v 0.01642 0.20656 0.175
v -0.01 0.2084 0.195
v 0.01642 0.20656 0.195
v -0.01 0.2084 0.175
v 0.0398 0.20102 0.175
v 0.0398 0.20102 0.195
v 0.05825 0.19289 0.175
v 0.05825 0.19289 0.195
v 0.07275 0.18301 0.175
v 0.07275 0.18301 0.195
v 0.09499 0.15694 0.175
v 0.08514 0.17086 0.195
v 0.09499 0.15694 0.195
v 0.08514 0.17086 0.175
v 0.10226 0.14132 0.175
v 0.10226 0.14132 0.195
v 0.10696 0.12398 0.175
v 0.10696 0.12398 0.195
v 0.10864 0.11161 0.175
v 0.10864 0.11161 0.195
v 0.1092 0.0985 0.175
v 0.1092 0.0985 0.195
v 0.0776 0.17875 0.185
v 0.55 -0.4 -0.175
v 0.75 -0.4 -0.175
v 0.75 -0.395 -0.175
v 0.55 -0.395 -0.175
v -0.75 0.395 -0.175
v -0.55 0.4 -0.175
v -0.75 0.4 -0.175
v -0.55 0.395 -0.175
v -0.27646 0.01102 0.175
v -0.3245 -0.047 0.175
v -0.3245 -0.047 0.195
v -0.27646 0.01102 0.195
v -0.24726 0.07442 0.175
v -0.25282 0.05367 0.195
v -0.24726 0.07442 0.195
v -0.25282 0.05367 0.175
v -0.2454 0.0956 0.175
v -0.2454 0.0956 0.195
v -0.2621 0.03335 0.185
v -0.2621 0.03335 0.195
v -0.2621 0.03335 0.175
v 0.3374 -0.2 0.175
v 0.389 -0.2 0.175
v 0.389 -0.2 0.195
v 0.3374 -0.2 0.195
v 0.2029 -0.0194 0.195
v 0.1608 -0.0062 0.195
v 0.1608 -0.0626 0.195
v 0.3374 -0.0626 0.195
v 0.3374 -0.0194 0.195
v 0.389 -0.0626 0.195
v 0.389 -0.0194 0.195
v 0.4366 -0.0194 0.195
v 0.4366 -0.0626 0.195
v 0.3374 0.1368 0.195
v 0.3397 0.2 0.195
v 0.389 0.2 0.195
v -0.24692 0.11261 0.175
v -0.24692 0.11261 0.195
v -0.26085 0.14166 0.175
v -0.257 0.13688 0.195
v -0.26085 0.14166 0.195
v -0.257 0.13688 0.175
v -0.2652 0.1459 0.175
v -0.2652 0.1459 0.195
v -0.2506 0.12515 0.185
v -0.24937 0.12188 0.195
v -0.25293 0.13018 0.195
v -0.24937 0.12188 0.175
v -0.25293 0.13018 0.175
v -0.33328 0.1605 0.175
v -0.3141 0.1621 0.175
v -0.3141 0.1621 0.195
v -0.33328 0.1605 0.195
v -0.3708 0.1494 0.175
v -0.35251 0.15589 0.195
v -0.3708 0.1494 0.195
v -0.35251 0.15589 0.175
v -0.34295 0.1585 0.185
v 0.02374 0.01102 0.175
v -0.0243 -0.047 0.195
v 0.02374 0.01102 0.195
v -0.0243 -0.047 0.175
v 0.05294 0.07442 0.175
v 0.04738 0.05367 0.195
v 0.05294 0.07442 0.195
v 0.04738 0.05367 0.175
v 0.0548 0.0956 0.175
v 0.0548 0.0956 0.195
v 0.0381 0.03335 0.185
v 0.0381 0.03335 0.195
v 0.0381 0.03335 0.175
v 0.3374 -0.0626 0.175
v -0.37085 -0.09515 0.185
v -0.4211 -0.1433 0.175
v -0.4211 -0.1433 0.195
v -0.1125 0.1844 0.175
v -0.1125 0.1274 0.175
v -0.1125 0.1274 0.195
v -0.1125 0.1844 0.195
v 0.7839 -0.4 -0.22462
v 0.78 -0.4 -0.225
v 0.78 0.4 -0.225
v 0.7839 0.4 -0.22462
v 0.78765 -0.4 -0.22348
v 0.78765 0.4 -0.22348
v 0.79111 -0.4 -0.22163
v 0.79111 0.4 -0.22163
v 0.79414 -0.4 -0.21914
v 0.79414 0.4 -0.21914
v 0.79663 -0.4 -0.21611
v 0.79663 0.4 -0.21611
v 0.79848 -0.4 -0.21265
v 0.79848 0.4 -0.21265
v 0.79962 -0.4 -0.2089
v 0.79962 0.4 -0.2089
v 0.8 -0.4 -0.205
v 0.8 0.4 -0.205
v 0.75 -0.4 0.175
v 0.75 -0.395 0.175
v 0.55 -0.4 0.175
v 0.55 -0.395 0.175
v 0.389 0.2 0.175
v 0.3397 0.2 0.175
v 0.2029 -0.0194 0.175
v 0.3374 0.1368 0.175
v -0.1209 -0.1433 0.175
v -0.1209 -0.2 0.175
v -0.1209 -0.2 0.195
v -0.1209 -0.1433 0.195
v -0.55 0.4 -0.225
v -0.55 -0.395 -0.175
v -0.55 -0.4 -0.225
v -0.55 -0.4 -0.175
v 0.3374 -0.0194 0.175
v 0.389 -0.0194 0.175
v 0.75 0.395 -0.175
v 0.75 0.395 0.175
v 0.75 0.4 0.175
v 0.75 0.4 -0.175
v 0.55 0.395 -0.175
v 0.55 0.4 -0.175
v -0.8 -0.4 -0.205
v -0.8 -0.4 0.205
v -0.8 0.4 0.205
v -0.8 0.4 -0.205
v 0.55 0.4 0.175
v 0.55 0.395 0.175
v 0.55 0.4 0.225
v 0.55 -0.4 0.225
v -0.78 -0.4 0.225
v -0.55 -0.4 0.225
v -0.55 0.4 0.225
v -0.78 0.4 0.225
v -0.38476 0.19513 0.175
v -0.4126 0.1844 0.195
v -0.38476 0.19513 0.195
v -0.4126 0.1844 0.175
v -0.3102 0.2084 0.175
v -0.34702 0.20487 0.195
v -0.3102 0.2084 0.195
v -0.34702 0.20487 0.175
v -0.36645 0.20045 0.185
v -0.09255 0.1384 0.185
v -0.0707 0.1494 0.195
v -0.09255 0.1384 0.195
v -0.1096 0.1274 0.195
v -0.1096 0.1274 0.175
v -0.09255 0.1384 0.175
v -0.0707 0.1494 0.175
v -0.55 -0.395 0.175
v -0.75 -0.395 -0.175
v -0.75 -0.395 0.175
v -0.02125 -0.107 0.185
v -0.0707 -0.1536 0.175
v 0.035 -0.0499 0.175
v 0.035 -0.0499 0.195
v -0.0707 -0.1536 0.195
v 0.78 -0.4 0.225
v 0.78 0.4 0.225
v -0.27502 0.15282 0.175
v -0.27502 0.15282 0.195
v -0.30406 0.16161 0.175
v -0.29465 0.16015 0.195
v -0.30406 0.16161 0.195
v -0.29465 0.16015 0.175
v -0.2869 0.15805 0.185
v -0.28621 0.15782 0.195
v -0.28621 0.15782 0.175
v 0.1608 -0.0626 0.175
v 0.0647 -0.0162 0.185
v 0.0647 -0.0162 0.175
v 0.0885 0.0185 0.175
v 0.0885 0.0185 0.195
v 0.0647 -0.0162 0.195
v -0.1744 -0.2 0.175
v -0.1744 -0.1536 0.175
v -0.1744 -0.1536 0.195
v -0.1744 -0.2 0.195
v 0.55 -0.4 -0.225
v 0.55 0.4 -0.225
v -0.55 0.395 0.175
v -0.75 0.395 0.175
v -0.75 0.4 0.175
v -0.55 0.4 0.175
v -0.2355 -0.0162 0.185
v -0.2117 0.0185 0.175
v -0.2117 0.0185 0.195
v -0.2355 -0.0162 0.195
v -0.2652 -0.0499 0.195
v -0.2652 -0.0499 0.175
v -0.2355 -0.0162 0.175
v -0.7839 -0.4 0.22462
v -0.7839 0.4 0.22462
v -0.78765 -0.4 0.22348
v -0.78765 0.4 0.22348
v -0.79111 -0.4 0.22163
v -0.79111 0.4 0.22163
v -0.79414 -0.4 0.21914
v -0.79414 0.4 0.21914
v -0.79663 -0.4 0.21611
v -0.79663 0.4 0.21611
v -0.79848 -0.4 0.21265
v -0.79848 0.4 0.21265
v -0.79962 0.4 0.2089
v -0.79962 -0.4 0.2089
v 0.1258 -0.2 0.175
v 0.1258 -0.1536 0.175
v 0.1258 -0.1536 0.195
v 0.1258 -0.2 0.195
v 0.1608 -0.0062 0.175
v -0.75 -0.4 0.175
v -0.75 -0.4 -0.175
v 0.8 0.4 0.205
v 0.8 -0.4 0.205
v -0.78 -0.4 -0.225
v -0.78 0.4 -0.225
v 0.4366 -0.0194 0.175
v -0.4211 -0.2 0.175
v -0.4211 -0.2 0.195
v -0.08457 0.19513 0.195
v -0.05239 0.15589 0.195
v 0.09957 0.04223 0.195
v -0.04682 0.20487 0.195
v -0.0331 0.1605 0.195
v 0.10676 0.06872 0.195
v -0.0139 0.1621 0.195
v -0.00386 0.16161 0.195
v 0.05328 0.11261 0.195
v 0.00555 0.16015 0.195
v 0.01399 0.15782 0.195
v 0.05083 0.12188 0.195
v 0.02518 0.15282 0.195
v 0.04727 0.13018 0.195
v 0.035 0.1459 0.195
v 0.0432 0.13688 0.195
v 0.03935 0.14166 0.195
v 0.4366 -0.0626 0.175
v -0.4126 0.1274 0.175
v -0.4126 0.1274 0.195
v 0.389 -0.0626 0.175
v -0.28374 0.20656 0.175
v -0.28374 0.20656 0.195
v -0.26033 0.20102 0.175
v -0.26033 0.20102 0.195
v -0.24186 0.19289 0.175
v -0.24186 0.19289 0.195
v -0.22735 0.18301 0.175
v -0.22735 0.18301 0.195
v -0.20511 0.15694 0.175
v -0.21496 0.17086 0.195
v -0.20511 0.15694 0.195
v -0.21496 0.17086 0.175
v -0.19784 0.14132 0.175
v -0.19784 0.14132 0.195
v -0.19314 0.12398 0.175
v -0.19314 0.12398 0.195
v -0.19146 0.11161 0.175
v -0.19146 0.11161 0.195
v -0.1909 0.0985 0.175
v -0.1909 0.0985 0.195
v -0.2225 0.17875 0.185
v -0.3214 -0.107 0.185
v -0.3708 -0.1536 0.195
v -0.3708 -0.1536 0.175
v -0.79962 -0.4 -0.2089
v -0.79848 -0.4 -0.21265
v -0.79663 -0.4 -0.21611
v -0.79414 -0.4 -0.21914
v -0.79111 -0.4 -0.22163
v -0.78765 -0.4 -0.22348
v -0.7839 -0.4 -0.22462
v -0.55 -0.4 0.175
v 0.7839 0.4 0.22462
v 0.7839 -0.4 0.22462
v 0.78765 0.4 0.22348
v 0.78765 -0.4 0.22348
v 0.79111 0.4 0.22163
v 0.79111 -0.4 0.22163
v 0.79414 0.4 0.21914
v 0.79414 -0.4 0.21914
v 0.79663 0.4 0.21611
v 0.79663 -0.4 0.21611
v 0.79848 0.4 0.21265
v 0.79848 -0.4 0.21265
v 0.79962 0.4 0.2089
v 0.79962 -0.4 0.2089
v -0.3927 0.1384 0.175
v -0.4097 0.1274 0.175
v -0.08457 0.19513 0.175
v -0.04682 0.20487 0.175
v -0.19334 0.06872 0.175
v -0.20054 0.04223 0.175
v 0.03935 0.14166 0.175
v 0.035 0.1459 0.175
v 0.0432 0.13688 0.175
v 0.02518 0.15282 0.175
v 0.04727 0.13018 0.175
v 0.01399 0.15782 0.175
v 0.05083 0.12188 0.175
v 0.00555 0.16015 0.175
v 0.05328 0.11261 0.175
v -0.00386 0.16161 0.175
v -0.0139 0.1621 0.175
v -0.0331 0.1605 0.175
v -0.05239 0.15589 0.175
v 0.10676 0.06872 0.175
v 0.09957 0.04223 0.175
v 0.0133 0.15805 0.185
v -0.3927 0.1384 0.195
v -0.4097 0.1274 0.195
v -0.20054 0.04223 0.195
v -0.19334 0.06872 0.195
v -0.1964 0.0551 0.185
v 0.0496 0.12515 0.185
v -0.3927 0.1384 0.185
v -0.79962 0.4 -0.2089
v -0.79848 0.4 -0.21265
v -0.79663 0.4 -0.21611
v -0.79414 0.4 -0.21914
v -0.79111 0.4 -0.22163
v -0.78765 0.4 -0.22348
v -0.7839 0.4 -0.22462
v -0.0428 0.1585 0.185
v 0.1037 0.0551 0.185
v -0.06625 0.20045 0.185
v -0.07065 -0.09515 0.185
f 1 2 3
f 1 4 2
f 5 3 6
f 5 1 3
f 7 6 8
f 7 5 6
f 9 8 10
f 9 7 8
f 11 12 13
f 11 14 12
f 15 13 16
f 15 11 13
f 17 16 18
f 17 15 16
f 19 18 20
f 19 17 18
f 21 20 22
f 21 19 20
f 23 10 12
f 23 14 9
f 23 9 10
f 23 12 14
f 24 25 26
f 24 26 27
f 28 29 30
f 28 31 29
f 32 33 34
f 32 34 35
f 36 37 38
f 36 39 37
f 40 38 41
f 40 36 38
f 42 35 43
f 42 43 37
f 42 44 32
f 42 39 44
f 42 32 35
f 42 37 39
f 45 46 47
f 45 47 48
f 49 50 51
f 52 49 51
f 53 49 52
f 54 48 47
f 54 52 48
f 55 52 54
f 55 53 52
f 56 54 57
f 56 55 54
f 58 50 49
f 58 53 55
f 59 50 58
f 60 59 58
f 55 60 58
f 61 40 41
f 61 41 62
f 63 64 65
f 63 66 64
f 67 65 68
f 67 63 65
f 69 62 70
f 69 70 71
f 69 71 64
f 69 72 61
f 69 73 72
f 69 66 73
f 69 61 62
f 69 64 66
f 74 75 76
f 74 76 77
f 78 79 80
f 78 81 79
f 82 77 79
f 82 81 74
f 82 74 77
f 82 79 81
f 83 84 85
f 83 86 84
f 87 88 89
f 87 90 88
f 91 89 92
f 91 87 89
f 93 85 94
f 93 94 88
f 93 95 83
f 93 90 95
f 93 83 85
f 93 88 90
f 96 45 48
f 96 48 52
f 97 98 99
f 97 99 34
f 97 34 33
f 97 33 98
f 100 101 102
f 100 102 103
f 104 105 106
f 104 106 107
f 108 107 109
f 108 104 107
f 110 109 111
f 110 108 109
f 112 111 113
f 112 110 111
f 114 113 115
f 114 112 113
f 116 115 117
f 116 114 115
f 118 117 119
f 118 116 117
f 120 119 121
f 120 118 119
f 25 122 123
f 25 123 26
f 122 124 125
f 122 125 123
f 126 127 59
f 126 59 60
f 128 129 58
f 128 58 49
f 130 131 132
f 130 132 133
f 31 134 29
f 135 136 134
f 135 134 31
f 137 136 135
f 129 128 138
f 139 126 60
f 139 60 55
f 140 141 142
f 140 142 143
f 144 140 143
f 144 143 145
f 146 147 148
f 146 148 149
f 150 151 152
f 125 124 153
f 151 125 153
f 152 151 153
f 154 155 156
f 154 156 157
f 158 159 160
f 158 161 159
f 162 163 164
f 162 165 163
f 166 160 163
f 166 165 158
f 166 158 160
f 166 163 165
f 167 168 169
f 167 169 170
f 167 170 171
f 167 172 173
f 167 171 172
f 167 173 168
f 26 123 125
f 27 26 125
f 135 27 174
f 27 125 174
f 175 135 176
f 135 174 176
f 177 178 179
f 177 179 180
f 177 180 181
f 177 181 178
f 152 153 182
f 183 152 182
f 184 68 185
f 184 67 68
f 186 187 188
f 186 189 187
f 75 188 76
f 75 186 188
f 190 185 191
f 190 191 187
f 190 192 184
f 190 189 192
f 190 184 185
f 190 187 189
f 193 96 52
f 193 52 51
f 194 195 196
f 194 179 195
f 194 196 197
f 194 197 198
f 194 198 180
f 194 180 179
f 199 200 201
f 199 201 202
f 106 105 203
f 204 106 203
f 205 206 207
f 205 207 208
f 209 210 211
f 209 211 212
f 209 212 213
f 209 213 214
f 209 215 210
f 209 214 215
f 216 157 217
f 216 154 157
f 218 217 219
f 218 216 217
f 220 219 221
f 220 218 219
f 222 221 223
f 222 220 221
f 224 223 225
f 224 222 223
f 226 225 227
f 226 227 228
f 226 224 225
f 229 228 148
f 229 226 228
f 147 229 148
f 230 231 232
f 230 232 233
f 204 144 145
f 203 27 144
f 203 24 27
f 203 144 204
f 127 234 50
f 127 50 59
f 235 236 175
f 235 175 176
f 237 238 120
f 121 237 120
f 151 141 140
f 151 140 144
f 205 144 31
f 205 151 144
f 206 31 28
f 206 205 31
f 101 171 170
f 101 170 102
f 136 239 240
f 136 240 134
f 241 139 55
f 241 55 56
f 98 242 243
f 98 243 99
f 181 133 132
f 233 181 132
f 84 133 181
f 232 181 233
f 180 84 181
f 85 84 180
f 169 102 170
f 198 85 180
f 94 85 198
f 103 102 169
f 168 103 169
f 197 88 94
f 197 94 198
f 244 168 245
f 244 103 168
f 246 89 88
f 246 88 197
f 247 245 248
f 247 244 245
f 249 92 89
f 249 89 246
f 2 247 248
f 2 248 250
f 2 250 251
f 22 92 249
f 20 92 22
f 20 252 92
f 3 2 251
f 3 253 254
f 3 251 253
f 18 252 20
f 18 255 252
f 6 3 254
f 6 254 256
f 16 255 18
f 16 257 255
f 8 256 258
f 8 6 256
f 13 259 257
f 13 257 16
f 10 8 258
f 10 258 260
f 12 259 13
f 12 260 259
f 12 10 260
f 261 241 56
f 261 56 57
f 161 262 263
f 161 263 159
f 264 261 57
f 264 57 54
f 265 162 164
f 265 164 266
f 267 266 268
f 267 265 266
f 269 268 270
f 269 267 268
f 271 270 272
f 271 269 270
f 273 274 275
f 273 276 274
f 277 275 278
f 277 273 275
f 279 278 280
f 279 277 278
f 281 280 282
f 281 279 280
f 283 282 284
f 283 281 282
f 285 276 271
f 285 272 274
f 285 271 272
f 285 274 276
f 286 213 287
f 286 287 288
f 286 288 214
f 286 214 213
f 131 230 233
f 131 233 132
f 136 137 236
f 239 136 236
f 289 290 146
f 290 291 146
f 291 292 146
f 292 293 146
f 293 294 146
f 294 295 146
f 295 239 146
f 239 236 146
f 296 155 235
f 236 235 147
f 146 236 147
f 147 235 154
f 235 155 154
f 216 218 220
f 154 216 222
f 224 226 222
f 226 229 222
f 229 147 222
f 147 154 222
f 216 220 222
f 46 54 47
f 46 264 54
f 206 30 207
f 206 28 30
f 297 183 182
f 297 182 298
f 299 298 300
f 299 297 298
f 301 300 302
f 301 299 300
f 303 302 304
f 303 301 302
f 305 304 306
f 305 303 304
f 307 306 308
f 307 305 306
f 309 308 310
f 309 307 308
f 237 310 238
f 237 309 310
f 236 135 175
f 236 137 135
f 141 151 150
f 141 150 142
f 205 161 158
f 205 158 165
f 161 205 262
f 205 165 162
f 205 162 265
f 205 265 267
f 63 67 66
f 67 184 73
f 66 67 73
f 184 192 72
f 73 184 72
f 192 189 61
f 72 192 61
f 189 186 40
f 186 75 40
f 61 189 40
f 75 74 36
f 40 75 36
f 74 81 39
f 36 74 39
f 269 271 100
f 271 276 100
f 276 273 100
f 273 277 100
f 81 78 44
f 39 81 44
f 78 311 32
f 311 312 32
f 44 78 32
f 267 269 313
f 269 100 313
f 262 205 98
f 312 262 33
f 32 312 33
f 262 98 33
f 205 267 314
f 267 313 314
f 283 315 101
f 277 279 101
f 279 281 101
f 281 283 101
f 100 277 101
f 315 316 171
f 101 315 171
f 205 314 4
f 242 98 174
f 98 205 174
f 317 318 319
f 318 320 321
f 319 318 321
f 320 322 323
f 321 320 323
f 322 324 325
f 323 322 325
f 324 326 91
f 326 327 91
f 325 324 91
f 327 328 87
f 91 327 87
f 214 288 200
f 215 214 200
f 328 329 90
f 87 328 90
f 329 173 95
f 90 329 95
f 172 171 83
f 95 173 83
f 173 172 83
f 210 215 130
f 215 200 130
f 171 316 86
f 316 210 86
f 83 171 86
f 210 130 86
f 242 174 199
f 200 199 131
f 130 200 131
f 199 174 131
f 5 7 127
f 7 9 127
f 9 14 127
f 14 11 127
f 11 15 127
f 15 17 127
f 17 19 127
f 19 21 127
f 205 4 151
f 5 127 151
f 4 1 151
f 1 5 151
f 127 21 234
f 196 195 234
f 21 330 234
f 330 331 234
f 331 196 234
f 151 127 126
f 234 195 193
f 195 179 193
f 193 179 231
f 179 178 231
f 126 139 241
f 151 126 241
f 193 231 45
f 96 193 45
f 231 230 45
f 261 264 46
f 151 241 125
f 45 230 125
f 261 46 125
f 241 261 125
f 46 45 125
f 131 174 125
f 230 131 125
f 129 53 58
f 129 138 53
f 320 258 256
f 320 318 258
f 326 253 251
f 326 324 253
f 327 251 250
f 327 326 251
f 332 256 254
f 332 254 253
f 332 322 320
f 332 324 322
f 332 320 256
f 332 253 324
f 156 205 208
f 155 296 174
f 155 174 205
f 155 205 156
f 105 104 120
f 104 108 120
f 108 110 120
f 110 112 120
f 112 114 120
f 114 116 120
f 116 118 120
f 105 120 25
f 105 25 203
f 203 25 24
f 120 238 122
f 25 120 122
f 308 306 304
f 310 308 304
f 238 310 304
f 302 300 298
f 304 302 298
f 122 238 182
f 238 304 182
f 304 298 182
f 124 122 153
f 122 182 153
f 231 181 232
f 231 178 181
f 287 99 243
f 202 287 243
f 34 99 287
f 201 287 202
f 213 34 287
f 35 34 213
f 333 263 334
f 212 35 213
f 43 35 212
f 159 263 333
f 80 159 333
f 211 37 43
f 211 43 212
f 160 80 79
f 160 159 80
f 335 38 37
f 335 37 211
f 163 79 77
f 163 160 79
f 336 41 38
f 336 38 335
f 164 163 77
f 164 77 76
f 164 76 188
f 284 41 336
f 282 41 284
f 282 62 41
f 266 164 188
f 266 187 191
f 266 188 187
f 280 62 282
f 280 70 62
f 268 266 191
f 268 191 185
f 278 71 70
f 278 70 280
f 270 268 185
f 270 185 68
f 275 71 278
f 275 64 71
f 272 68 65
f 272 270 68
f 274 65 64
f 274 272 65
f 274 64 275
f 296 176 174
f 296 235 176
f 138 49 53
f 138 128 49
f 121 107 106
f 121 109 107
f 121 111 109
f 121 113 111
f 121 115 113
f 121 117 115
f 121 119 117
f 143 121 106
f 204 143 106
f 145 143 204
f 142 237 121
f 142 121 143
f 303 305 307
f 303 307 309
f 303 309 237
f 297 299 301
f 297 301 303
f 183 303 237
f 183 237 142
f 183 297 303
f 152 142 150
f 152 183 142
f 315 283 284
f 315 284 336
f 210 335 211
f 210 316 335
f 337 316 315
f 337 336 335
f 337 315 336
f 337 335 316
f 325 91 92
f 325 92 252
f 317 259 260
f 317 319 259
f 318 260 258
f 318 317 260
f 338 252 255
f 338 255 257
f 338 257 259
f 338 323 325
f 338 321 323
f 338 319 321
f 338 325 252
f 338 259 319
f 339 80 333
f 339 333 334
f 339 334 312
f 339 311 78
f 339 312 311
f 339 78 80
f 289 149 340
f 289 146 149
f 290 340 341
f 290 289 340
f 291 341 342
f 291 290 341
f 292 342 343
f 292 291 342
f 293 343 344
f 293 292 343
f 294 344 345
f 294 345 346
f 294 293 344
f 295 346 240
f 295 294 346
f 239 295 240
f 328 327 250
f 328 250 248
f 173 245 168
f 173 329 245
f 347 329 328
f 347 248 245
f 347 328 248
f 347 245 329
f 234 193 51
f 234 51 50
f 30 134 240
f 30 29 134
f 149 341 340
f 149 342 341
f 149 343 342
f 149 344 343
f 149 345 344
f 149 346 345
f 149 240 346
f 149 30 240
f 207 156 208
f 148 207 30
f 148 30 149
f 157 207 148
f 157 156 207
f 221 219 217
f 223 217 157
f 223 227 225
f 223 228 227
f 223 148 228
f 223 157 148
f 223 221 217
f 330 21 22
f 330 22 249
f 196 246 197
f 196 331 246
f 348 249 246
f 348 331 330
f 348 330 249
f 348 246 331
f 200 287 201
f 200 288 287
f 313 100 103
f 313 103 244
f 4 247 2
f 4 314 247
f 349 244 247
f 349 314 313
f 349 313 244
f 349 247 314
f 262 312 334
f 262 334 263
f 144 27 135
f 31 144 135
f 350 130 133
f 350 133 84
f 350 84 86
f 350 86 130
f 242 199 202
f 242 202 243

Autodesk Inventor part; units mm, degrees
ref_plane "YZ Plane" through (0, 0, 0) normal (1, 0, 0) x (0, 1, 0)
ref_plane "XZ Plane" through (0, 0, 0) normal (0, 1, 0) x (-1, 0, 0)
ref_plane "XY Plane" through (0, 0, 0) normal (0, 0, 1) x (1, 0, 0)
sketch "Sketch1" plane through (0, 0, 0) normal (0, 1, 0) x (-1, 0, 0)
  line L0 (0.75, 0.175) -> (-0.75, 0.175)
  line L1 (-0.75, 0.175) -> (-0.75, -0.175)
  line L2 (-0.75, -0.175) -> (0.75, -0.175)
  line L3 (0.75, -0.175) -> (0.75, 0.175)
  line L4 (0.55, 0.175) -> (0.55, 0.225)
  line L5 (0.55, 0.225) -> (0.8, 0.225)
  line L6 (0.8, 0.225) -> (0.8, -0.225)
  line L7 (0.8, -0.225) -> (0.55, -0.225)
  line L8 (0.55, -0.225) -> (0.55, -0.175)
  line L9 (-0.55, 0.175) -> (-0.55, 0.225)
  line L10 (-0.55, 0.225) -> (-0.8, 0.225)
  line L11 (-0.8, 0.225) -> (-0.8, -0.225)
  line L12 (-0.8, -0.225) -> (-0.55, -0.225)
  line L13 (-0.55, -0.175) -> (-0.55, -0.225)
  line L14 (0.55, 0.175) -> (-0.55, 0.175)
  point P0 (0, 0)
  point P1 (0, 0.175)
  point P2 (0.75, 0)
  dimension "d0" = 1.6
  dimension "d1" = 0.05
  dimension "d2" = 0.05
  dimension "d3" = 0.45
  dimension "d4" = 0.25
extrude "Extrusion1" add sketch "Sketch1" along normal mid plane 0.8 contours L0 L4 L5 L6 L7 L8 L2 L3 | L0 L1 L2 L13 L12 L11 L10 L9
extrude "Extrusion2" add sketch "Sketch1" along normal mid plane 0.79 contours L3 L2 L1 L0
sketch "Sketch2" plane through (-0.55, -0.395, 0.175) normal (0, 0, 1) x (1, 0, 0)
  line L0 (0, 0) -> (0, 0.79) projected
  line L1 (1.1, 0) -> (0, 0) projected
  line L2 (1.1, 0) -> (1.1, 0.79) projected
  line L3 (0, 0.79) -> (1.1, 0.79) projected
  line L4 (0, 0.395) -> (1.1, 0.395) construction
  line L5 (0.3756, 0.195) -> (0.1289, 0.195)
  line L6 (0.1289, 0.195) -> (0.1289, 0.2517)
  spline S0 degree 2 poles (0.1289, 0.2517) (0.1555, 0.2767) (0.2028, 0.323) (0.2255, 0.348) knots 0 0 0 1 2 2 2
  spline S1 degree 2 poles (0.2255, 0.348) (0.2712, 0.3982) (0.3046, 0.4585) (0.3046, 0.4906) knots 0 0 0 1 2 2 2
  spline S2 degree 2 poles (0.3046, 0.4906) (0.3046, 0.5075) (0.2942, 0.5328) (0.2848, 0.5409) knots 0 0 0 1 2 2 2
  spline S3 degree 2 poles (0.2848, 0.5409) (0.2754, 0.549) (0.2508, 0.5571) (0.2359, 0.5571) knots 0 0 0 1 2 2 2
  spline S4 degree 2 poles (0.2359, 0.5571) (0.2216, 0.5571) (0.1925, 0.5499) (0.1792, 0.5444) knots 0 0 0 1 2 2 2
  spline S5 degree 2 poles (0.1792, 0.5444) (0.1678, 0.5399) (0.1468, 0.5269) (0.1403, 0.5224) knots 0 0 0 1 2 2 2
  line L7 (0.1403, 0.5224) -> (0.1374, 0.5224)
  line L8 (0.1374, 0.5224) -> (0.1374, 0.5794)
  spline S6 degree 2 poles (0.1374, 0.5794) (0.1539, 0.5875) (0.2132, 0.6034) (0.2398, 0.6034) knots 0 0 0 1 2 2 2
  spline S7 degree 2 poles (0.2398, 0.6034) (0.2959, 0.6034) (0.3591, 0.5441) (0.3591, 0.4935) knots 0 0 0 1 2 2 2
  spline S8 degree 2 poles (0.3591, 0.4935) (0.3591, 0.4699) (0.3481, 0.4303) (0.3383, 0.4135) knots 0 0 0 1 2 2 2
  spline S9 degree 2 poles (0.3383, 0.4135) (0.3286, 0.396) (0.3004, 0.3616) (0.2848, 0.3451) knots 0 0 0 1 2 2 2
  spline S10 degree 2 poles (0.2848, 0.3451) (0.2596, 0.3175) (0.1976, 0.2585) (0.1792, 0.2414) knots 0 0 0 1 2 2 2
  line L9 (0.1792, 0.2414) -> (0.3756, 0.2414)
  line L10 (0.3756, 0.2414) -> (0.3756, 0.195)
  line L11 (0.6758, 0.195) -> (0.4291, 0.195)
  line L12 (0.4291, 0.195) -> (0.4291, 0.2517)
  spline S11 degree 2 poles (0.4291, 0.2517) (0.4557, 0.2767) (0.503, 0.323) (0.5257, 0.348) knots 0 0 0 1 2 2 2
  spline S12 degree 2 poles (0.5257, 0.348) (0.5714, 0.3982) (0.6048, 0.4585) (0.6048, 0.4906) knots 0 0 0 1 2 2 2
  spline S13 degree 2 poles (0.6048, 0.4906) (0.6048, 0.5075) (0.5944, 0.5328) (0.585, 0.5409) knots 0 0 0 1 2 2 2
  spline S14 degree 2 poles (0.585, 0.5409) (0.5756, 0.549) (0.551, 0.5571) (0.5361, 0.5571) knots 0 0 0 1 2 2 2
  spline S15 degree 2 poles (0.5361, 0.5571) (0.5218, 0.5571) (0.4926, 0.5499) (0.4793, 0.5444) knots 0 0 0 1 2 2 2
  spline S16 degree 2 poles (0.4793, 0.5444) (0.468, 0.5399) (0.4469, 0.5269) (0.4404, 0.5224) knots 0 0 0 1 2 2 2
  line L13 (0.4404, 0.5224) -> (0.4375, 0.5224)
  line L14 (0.4375, 0.5224) -> (0.4375, 0.5794)
  spline S17 degree 2 poles (0.4375, 0.5794) (0.4541, 0.5875) (0.5134, 0.6034) (0.54, 0.6034) knots 0 0 0 1 2 2 2
  spline S18 degree 2 poles (0.54, 0.6034) (0.596, 0.6034) (0.6592, 0.5441) (0.6592, 0.4935) knots 0 0 0 1 2 2 2
  spline S19 degree 2 poles (0.6592, 0.4935) (0.6592, 0.4699) (0.6482, 0.4303) (0.6385, 0.4135) knots 0 0 0 1 2 2 2
  spline S20 degree 2 poles (0.6385, 0.4135) (0.6288, 0.396) (0.6006, 0.3616) (0.585, 0.3451) knots 0 0 0 1 2 2 2
  spline S21 degree 2 poles (0.585, 0.3451) (0.5597, 0.3175) (0.4978, 0.2585) (0.4793, 0.2414) knots 0 0 0 1 2 2 2
  line L15 (0.4793, 0.2414) -> (0.6758, 0.2414)
  line L16 (0.6758, 0.2414) -> (0.6758, 0.195)
  line L17 (0.9866, 0.3324) -> (0.939, 0.3324)
  line L18 (0.939, 0.3324) -> (0.939, 0.195)
  line L19 (0.939, 0.195) -> (0.8874, 0.195)
  line L20 (0.8874, 0.195) -> (0.8874, 0.3324)
  line L21 (0.8874, 0.3324) -> (0.7108, 0.3324)
  line L22 (0.7108, 0.3324) -> (0.7108, 0.3888)
  line L23 (0.7108, 0.3888) -> (0.8897, 0.595)
  line L24 (0.8897, 0.595) -> (0.939, 0.595)
  line L25 (0.939, 0.595) -> (0.939, 0.3756)
  line L26 (0.939, 0.3756) -> (0.9866, 0.3756)
  line L27 (0.9866, 0.3756) -> (0.9866, 0.3324)
  line L28 (0.8874, 0.3756) -> (0.8874, 0.5318)
  line L29 (0.8874, 0.5318) -> (0.7529, 0.3756)
  line L30 (0.7529, 0.3756) -> (0.8874, 0.3756)
  point P0 (0.55, 0.395)
extrude "Extrusion3" add sketch "Sketch2" along normal blind 0.02 contours L5 L6 S0 S1 S2 S3 S4 S5 L7 L8 S6 S7 S8 S9 S10 L9 L10 | L11 L12 S11 S12 S13 S14 S15 S16 L13 L14 S17 S18 S19 S20 S21 L15 L16 | L17 L18 L19 L20 L21 L22 L23 L24 L25 L26 L27
fillet "Fillet1" radius 0.02 4 edges at (-0.8, 0, 0.225) (-0.8, 0, -0.225) (0.8, 0, 0.225) (0.8, 0, -0.225)
equation "\"d2\" = d1"
properties part number "21-1001" material "Copper"
